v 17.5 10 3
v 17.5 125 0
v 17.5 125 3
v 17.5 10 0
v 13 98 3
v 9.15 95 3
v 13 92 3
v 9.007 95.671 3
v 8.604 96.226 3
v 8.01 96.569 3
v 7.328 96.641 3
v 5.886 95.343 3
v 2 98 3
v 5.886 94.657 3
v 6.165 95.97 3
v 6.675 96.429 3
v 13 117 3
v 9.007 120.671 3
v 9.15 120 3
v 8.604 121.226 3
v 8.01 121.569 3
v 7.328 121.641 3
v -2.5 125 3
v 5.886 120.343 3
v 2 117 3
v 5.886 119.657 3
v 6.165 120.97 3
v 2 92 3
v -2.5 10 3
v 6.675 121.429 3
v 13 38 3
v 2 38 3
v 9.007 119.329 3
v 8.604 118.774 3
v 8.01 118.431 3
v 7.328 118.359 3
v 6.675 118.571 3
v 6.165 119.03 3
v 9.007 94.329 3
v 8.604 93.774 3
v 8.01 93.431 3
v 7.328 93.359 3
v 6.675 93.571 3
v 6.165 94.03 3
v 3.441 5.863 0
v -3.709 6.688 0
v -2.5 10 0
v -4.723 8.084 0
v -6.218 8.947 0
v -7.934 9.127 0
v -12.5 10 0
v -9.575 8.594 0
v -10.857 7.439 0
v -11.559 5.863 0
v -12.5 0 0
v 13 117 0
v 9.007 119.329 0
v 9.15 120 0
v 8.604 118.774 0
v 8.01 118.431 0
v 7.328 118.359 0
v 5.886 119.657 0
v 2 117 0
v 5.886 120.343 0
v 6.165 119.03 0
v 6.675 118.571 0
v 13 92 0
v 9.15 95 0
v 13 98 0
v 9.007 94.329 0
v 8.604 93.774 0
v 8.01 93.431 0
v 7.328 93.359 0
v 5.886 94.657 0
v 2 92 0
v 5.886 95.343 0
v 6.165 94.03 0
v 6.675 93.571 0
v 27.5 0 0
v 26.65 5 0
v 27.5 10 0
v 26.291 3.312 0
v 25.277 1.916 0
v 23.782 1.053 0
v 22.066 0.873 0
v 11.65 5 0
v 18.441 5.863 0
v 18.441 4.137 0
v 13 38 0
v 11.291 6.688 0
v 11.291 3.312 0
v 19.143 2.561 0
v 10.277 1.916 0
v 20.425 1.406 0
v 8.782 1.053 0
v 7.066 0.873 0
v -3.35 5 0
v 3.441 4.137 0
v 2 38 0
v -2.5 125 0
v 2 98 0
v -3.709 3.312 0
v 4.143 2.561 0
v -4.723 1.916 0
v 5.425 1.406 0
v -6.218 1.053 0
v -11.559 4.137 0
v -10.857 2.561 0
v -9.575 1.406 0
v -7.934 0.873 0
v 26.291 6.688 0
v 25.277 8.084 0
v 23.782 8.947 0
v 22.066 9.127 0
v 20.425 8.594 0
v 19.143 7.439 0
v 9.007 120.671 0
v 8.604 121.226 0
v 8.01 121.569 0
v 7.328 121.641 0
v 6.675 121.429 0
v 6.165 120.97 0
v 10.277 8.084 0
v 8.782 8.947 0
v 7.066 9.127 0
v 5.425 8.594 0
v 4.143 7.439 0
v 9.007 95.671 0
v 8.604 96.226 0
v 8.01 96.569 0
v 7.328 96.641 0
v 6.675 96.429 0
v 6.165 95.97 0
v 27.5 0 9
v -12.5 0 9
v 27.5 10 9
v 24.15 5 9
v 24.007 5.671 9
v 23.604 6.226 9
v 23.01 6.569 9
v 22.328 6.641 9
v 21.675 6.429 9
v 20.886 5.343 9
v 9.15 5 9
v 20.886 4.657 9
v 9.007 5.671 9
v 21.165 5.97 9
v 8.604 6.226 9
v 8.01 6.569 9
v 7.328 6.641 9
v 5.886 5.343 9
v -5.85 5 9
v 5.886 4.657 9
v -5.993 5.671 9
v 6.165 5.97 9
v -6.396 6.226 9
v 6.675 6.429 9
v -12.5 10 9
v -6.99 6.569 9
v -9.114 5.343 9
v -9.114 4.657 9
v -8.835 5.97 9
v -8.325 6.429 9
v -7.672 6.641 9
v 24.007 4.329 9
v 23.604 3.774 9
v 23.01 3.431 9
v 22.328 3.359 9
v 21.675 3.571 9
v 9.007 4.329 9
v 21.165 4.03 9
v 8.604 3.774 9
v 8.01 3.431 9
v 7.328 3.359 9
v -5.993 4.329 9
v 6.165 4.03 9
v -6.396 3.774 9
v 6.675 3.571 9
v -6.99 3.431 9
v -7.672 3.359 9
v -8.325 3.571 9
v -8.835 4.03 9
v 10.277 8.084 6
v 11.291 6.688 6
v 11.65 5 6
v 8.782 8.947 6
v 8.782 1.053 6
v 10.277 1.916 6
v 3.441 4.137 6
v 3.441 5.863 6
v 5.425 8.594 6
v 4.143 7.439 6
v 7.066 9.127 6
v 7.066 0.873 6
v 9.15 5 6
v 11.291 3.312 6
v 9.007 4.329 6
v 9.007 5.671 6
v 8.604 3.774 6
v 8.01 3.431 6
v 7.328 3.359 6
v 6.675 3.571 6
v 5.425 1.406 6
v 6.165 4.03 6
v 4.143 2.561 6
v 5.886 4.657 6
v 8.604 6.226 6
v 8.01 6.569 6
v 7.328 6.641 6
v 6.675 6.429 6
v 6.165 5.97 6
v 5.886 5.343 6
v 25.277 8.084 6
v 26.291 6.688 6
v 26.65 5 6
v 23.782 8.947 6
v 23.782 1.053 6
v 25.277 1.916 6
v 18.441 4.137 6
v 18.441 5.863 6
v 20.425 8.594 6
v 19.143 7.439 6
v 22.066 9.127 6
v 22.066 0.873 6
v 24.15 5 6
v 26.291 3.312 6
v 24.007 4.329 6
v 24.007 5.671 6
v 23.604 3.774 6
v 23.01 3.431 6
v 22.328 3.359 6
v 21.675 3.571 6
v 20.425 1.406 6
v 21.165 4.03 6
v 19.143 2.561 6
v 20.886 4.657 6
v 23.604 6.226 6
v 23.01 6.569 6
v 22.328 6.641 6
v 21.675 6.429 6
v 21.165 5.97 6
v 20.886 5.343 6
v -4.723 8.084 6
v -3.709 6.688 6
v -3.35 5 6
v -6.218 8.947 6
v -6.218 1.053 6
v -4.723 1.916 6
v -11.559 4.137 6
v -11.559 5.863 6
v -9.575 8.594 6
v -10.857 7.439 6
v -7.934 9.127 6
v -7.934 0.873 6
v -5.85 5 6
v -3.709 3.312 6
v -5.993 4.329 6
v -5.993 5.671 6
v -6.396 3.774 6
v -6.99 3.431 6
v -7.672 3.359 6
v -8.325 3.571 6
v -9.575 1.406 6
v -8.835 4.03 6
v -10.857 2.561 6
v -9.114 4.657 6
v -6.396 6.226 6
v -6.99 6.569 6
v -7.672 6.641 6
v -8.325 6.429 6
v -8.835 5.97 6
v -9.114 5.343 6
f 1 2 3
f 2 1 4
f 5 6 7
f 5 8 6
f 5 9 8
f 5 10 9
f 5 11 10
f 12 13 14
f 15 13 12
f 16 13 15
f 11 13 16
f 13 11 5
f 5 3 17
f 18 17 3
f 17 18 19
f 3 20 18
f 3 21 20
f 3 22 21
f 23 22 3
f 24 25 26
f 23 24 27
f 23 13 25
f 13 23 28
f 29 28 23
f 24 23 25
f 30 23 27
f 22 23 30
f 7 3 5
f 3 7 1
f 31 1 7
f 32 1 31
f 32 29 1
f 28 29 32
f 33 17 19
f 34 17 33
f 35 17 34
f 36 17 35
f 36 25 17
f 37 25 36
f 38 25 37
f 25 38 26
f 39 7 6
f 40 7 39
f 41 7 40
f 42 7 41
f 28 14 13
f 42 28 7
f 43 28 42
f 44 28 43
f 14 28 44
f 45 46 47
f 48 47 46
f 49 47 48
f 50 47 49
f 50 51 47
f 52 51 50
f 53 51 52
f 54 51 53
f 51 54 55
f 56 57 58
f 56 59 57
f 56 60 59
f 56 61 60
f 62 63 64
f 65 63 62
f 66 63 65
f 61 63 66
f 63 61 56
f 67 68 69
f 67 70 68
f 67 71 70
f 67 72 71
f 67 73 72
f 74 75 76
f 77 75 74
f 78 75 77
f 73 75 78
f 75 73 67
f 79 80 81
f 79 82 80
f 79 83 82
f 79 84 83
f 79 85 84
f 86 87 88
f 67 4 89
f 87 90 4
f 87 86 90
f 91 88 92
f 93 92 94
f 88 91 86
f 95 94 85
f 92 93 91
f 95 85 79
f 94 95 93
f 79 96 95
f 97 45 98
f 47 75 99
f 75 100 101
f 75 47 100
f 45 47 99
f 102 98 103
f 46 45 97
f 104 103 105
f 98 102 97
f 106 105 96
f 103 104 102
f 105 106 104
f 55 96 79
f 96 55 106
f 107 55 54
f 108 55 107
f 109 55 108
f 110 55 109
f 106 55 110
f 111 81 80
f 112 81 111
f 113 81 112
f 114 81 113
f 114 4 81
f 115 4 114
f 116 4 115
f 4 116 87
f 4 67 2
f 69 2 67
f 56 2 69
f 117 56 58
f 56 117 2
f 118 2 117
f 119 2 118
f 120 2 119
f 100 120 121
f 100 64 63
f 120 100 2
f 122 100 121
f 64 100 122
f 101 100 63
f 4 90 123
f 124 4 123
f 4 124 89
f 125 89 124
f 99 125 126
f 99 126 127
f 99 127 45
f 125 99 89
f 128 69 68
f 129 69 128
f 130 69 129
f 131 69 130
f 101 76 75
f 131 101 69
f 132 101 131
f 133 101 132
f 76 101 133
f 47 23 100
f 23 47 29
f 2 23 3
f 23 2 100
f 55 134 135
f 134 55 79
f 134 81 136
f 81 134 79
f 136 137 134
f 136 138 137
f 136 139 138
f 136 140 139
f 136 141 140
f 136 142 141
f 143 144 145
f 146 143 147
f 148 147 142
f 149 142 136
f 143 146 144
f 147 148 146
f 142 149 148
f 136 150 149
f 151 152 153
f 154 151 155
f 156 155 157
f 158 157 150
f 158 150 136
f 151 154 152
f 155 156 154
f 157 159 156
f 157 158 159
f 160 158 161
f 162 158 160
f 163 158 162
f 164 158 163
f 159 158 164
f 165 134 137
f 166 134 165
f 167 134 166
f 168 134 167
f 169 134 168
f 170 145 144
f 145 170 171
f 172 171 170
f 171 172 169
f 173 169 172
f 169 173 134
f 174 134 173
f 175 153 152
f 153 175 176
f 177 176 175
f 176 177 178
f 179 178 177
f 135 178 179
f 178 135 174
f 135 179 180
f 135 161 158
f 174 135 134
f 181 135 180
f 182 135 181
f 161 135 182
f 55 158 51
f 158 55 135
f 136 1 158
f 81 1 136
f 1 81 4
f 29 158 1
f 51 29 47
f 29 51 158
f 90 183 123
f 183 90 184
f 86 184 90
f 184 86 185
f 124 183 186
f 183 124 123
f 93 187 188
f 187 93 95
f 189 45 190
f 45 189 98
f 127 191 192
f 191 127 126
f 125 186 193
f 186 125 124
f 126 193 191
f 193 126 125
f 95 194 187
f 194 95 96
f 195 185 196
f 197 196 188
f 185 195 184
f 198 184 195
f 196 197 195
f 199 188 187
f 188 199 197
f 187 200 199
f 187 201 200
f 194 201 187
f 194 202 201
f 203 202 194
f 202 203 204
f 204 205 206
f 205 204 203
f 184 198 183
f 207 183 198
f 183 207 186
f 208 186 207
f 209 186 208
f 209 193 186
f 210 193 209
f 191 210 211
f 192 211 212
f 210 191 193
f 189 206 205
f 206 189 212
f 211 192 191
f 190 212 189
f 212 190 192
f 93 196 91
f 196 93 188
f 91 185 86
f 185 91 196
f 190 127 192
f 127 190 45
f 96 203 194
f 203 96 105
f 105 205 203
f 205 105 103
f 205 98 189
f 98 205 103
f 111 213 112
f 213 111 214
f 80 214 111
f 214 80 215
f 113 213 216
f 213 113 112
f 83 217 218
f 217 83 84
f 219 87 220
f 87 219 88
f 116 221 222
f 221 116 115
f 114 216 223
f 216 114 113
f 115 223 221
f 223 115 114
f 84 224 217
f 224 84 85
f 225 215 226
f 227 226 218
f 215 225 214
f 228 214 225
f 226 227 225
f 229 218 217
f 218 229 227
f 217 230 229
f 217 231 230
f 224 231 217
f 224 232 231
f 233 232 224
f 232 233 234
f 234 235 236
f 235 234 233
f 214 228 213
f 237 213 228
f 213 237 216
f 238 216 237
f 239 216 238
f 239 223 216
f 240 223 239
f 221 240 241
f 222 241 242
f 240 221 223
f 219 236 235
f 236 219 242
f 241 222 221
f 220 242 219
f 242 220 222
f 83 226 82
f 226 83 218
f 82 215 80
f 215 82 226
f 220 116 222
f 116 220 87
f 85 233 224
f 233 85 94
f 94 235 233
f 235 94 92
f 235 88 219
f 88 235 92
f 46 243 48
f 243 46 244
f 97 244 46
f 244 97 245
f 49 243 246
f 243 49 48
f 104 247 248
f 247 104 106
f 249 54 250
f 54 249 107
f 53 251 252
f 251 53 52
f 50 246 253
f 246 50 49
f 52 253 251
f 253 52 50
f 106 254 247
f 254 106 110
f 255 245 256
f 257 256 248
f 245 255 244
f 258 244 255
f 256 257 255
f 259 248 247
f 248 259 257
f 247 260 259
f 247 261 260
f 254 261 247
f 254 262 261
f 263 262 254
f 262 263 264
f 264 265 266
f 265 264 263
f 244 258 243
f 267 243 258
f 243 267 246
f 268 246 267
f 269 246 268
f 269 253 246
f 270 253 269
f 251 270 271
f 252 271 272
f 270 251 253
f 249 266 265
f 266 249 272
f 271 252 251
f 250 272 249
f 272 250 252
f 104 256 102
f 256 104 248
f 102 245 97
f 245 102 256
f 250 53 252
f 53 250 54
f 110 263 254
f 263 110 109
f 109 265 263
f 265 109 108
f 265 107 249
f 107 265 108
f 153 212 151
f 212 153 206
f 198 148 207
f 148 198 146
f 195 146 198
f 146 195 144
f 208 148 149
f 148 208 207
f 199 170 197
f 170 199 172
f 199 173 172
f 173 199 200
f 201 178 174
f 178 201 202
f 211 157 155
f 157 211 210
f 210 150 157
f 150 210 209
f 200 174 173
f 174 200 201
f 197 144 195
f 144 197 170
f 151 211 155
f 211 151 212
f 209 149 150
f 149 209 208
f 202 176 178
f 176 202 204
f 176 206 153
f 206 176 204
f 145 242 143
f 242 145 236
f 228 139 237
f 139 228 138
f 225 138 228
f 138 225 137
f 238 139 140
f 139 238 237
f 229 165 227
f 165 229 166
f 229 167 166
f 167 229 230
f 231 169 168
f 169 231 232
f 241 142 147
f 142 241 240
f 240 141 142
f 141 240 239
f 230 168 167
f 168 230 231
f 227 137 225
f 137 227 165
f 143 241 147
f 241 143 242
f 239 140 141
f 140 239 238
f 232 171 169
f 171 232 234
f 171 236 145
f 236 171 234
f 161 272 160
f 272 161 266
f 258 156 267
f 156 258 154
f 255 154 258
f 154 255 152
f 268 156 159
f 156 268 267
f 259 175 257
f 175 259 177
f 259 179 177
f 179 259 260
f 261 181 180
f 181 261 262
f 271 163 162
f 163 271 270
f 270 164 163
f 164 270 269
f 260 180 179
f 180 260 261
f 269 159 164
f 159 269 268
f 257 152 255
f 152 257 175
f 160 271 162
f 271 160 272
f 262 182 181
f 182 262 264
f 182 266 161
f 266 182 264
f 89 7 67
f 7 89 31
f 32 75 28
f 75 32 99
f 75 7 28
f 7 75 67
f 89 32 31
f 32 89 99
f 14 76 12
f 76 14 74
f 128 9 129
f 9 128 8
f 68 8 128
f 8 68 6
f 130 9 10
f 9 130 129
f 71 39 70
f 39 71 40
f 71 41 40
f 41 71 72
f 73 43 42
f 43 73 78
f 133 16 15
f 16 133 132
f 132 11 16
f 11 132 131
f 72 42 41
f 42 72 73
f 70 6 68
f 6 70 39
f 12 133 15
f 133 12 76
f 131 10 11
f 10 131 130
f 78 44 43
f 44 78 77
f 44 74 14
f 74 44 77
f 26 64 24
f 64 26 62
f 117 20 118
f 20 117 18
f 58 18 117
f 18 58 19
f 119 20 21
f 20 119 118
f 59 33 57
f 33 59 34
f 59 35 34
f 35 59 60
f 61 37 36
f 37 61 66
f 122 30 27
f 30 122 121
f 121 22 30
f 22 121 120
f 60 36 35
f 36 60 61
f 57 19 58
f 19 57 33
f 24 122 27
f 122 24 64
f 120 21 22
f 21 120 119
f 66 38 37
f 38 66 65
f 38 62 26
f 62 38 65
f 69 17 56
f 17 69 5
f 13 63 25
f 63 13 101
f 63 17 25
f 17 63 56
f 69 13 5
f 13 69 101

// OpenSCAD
difference(){
union(){
translate([-2.5,0,0]) cube([20,125,3]);
translate([-12.5,0,0]) cube([40,10,9]);
}
translate([15/2,5,0]) cylinder(d=3.3,h=9, $fn=15);
translate([15/2+15,5,0]) cylinder(d=3.3,h=9, $fn=15);
translate([15/2-15,5,0]) cylinder(d=3.3,h=9, $fn=15);
translate([0,0,-3]){
translate([15/2,5,0]) cylinder(d=8.3,h=9, $fn=15);
translate([15/2+15,5,0]) cylinder(d=8.3,h=9, $fn=15);
translate([15/2-15,5,0]) cylinder(d=8.3,h=9, $fn=15);
}
translate([2,38,0]) cube([11,95-41,3]);
translate([15/2,95,0]) cylinder(d=3.3,h=3, $fn=15);
translate([15/2,120,0]) cylinder(d=3.3,h=3, $fn=15);
translate([2,98,0]) cube([11,19,3]);
}
